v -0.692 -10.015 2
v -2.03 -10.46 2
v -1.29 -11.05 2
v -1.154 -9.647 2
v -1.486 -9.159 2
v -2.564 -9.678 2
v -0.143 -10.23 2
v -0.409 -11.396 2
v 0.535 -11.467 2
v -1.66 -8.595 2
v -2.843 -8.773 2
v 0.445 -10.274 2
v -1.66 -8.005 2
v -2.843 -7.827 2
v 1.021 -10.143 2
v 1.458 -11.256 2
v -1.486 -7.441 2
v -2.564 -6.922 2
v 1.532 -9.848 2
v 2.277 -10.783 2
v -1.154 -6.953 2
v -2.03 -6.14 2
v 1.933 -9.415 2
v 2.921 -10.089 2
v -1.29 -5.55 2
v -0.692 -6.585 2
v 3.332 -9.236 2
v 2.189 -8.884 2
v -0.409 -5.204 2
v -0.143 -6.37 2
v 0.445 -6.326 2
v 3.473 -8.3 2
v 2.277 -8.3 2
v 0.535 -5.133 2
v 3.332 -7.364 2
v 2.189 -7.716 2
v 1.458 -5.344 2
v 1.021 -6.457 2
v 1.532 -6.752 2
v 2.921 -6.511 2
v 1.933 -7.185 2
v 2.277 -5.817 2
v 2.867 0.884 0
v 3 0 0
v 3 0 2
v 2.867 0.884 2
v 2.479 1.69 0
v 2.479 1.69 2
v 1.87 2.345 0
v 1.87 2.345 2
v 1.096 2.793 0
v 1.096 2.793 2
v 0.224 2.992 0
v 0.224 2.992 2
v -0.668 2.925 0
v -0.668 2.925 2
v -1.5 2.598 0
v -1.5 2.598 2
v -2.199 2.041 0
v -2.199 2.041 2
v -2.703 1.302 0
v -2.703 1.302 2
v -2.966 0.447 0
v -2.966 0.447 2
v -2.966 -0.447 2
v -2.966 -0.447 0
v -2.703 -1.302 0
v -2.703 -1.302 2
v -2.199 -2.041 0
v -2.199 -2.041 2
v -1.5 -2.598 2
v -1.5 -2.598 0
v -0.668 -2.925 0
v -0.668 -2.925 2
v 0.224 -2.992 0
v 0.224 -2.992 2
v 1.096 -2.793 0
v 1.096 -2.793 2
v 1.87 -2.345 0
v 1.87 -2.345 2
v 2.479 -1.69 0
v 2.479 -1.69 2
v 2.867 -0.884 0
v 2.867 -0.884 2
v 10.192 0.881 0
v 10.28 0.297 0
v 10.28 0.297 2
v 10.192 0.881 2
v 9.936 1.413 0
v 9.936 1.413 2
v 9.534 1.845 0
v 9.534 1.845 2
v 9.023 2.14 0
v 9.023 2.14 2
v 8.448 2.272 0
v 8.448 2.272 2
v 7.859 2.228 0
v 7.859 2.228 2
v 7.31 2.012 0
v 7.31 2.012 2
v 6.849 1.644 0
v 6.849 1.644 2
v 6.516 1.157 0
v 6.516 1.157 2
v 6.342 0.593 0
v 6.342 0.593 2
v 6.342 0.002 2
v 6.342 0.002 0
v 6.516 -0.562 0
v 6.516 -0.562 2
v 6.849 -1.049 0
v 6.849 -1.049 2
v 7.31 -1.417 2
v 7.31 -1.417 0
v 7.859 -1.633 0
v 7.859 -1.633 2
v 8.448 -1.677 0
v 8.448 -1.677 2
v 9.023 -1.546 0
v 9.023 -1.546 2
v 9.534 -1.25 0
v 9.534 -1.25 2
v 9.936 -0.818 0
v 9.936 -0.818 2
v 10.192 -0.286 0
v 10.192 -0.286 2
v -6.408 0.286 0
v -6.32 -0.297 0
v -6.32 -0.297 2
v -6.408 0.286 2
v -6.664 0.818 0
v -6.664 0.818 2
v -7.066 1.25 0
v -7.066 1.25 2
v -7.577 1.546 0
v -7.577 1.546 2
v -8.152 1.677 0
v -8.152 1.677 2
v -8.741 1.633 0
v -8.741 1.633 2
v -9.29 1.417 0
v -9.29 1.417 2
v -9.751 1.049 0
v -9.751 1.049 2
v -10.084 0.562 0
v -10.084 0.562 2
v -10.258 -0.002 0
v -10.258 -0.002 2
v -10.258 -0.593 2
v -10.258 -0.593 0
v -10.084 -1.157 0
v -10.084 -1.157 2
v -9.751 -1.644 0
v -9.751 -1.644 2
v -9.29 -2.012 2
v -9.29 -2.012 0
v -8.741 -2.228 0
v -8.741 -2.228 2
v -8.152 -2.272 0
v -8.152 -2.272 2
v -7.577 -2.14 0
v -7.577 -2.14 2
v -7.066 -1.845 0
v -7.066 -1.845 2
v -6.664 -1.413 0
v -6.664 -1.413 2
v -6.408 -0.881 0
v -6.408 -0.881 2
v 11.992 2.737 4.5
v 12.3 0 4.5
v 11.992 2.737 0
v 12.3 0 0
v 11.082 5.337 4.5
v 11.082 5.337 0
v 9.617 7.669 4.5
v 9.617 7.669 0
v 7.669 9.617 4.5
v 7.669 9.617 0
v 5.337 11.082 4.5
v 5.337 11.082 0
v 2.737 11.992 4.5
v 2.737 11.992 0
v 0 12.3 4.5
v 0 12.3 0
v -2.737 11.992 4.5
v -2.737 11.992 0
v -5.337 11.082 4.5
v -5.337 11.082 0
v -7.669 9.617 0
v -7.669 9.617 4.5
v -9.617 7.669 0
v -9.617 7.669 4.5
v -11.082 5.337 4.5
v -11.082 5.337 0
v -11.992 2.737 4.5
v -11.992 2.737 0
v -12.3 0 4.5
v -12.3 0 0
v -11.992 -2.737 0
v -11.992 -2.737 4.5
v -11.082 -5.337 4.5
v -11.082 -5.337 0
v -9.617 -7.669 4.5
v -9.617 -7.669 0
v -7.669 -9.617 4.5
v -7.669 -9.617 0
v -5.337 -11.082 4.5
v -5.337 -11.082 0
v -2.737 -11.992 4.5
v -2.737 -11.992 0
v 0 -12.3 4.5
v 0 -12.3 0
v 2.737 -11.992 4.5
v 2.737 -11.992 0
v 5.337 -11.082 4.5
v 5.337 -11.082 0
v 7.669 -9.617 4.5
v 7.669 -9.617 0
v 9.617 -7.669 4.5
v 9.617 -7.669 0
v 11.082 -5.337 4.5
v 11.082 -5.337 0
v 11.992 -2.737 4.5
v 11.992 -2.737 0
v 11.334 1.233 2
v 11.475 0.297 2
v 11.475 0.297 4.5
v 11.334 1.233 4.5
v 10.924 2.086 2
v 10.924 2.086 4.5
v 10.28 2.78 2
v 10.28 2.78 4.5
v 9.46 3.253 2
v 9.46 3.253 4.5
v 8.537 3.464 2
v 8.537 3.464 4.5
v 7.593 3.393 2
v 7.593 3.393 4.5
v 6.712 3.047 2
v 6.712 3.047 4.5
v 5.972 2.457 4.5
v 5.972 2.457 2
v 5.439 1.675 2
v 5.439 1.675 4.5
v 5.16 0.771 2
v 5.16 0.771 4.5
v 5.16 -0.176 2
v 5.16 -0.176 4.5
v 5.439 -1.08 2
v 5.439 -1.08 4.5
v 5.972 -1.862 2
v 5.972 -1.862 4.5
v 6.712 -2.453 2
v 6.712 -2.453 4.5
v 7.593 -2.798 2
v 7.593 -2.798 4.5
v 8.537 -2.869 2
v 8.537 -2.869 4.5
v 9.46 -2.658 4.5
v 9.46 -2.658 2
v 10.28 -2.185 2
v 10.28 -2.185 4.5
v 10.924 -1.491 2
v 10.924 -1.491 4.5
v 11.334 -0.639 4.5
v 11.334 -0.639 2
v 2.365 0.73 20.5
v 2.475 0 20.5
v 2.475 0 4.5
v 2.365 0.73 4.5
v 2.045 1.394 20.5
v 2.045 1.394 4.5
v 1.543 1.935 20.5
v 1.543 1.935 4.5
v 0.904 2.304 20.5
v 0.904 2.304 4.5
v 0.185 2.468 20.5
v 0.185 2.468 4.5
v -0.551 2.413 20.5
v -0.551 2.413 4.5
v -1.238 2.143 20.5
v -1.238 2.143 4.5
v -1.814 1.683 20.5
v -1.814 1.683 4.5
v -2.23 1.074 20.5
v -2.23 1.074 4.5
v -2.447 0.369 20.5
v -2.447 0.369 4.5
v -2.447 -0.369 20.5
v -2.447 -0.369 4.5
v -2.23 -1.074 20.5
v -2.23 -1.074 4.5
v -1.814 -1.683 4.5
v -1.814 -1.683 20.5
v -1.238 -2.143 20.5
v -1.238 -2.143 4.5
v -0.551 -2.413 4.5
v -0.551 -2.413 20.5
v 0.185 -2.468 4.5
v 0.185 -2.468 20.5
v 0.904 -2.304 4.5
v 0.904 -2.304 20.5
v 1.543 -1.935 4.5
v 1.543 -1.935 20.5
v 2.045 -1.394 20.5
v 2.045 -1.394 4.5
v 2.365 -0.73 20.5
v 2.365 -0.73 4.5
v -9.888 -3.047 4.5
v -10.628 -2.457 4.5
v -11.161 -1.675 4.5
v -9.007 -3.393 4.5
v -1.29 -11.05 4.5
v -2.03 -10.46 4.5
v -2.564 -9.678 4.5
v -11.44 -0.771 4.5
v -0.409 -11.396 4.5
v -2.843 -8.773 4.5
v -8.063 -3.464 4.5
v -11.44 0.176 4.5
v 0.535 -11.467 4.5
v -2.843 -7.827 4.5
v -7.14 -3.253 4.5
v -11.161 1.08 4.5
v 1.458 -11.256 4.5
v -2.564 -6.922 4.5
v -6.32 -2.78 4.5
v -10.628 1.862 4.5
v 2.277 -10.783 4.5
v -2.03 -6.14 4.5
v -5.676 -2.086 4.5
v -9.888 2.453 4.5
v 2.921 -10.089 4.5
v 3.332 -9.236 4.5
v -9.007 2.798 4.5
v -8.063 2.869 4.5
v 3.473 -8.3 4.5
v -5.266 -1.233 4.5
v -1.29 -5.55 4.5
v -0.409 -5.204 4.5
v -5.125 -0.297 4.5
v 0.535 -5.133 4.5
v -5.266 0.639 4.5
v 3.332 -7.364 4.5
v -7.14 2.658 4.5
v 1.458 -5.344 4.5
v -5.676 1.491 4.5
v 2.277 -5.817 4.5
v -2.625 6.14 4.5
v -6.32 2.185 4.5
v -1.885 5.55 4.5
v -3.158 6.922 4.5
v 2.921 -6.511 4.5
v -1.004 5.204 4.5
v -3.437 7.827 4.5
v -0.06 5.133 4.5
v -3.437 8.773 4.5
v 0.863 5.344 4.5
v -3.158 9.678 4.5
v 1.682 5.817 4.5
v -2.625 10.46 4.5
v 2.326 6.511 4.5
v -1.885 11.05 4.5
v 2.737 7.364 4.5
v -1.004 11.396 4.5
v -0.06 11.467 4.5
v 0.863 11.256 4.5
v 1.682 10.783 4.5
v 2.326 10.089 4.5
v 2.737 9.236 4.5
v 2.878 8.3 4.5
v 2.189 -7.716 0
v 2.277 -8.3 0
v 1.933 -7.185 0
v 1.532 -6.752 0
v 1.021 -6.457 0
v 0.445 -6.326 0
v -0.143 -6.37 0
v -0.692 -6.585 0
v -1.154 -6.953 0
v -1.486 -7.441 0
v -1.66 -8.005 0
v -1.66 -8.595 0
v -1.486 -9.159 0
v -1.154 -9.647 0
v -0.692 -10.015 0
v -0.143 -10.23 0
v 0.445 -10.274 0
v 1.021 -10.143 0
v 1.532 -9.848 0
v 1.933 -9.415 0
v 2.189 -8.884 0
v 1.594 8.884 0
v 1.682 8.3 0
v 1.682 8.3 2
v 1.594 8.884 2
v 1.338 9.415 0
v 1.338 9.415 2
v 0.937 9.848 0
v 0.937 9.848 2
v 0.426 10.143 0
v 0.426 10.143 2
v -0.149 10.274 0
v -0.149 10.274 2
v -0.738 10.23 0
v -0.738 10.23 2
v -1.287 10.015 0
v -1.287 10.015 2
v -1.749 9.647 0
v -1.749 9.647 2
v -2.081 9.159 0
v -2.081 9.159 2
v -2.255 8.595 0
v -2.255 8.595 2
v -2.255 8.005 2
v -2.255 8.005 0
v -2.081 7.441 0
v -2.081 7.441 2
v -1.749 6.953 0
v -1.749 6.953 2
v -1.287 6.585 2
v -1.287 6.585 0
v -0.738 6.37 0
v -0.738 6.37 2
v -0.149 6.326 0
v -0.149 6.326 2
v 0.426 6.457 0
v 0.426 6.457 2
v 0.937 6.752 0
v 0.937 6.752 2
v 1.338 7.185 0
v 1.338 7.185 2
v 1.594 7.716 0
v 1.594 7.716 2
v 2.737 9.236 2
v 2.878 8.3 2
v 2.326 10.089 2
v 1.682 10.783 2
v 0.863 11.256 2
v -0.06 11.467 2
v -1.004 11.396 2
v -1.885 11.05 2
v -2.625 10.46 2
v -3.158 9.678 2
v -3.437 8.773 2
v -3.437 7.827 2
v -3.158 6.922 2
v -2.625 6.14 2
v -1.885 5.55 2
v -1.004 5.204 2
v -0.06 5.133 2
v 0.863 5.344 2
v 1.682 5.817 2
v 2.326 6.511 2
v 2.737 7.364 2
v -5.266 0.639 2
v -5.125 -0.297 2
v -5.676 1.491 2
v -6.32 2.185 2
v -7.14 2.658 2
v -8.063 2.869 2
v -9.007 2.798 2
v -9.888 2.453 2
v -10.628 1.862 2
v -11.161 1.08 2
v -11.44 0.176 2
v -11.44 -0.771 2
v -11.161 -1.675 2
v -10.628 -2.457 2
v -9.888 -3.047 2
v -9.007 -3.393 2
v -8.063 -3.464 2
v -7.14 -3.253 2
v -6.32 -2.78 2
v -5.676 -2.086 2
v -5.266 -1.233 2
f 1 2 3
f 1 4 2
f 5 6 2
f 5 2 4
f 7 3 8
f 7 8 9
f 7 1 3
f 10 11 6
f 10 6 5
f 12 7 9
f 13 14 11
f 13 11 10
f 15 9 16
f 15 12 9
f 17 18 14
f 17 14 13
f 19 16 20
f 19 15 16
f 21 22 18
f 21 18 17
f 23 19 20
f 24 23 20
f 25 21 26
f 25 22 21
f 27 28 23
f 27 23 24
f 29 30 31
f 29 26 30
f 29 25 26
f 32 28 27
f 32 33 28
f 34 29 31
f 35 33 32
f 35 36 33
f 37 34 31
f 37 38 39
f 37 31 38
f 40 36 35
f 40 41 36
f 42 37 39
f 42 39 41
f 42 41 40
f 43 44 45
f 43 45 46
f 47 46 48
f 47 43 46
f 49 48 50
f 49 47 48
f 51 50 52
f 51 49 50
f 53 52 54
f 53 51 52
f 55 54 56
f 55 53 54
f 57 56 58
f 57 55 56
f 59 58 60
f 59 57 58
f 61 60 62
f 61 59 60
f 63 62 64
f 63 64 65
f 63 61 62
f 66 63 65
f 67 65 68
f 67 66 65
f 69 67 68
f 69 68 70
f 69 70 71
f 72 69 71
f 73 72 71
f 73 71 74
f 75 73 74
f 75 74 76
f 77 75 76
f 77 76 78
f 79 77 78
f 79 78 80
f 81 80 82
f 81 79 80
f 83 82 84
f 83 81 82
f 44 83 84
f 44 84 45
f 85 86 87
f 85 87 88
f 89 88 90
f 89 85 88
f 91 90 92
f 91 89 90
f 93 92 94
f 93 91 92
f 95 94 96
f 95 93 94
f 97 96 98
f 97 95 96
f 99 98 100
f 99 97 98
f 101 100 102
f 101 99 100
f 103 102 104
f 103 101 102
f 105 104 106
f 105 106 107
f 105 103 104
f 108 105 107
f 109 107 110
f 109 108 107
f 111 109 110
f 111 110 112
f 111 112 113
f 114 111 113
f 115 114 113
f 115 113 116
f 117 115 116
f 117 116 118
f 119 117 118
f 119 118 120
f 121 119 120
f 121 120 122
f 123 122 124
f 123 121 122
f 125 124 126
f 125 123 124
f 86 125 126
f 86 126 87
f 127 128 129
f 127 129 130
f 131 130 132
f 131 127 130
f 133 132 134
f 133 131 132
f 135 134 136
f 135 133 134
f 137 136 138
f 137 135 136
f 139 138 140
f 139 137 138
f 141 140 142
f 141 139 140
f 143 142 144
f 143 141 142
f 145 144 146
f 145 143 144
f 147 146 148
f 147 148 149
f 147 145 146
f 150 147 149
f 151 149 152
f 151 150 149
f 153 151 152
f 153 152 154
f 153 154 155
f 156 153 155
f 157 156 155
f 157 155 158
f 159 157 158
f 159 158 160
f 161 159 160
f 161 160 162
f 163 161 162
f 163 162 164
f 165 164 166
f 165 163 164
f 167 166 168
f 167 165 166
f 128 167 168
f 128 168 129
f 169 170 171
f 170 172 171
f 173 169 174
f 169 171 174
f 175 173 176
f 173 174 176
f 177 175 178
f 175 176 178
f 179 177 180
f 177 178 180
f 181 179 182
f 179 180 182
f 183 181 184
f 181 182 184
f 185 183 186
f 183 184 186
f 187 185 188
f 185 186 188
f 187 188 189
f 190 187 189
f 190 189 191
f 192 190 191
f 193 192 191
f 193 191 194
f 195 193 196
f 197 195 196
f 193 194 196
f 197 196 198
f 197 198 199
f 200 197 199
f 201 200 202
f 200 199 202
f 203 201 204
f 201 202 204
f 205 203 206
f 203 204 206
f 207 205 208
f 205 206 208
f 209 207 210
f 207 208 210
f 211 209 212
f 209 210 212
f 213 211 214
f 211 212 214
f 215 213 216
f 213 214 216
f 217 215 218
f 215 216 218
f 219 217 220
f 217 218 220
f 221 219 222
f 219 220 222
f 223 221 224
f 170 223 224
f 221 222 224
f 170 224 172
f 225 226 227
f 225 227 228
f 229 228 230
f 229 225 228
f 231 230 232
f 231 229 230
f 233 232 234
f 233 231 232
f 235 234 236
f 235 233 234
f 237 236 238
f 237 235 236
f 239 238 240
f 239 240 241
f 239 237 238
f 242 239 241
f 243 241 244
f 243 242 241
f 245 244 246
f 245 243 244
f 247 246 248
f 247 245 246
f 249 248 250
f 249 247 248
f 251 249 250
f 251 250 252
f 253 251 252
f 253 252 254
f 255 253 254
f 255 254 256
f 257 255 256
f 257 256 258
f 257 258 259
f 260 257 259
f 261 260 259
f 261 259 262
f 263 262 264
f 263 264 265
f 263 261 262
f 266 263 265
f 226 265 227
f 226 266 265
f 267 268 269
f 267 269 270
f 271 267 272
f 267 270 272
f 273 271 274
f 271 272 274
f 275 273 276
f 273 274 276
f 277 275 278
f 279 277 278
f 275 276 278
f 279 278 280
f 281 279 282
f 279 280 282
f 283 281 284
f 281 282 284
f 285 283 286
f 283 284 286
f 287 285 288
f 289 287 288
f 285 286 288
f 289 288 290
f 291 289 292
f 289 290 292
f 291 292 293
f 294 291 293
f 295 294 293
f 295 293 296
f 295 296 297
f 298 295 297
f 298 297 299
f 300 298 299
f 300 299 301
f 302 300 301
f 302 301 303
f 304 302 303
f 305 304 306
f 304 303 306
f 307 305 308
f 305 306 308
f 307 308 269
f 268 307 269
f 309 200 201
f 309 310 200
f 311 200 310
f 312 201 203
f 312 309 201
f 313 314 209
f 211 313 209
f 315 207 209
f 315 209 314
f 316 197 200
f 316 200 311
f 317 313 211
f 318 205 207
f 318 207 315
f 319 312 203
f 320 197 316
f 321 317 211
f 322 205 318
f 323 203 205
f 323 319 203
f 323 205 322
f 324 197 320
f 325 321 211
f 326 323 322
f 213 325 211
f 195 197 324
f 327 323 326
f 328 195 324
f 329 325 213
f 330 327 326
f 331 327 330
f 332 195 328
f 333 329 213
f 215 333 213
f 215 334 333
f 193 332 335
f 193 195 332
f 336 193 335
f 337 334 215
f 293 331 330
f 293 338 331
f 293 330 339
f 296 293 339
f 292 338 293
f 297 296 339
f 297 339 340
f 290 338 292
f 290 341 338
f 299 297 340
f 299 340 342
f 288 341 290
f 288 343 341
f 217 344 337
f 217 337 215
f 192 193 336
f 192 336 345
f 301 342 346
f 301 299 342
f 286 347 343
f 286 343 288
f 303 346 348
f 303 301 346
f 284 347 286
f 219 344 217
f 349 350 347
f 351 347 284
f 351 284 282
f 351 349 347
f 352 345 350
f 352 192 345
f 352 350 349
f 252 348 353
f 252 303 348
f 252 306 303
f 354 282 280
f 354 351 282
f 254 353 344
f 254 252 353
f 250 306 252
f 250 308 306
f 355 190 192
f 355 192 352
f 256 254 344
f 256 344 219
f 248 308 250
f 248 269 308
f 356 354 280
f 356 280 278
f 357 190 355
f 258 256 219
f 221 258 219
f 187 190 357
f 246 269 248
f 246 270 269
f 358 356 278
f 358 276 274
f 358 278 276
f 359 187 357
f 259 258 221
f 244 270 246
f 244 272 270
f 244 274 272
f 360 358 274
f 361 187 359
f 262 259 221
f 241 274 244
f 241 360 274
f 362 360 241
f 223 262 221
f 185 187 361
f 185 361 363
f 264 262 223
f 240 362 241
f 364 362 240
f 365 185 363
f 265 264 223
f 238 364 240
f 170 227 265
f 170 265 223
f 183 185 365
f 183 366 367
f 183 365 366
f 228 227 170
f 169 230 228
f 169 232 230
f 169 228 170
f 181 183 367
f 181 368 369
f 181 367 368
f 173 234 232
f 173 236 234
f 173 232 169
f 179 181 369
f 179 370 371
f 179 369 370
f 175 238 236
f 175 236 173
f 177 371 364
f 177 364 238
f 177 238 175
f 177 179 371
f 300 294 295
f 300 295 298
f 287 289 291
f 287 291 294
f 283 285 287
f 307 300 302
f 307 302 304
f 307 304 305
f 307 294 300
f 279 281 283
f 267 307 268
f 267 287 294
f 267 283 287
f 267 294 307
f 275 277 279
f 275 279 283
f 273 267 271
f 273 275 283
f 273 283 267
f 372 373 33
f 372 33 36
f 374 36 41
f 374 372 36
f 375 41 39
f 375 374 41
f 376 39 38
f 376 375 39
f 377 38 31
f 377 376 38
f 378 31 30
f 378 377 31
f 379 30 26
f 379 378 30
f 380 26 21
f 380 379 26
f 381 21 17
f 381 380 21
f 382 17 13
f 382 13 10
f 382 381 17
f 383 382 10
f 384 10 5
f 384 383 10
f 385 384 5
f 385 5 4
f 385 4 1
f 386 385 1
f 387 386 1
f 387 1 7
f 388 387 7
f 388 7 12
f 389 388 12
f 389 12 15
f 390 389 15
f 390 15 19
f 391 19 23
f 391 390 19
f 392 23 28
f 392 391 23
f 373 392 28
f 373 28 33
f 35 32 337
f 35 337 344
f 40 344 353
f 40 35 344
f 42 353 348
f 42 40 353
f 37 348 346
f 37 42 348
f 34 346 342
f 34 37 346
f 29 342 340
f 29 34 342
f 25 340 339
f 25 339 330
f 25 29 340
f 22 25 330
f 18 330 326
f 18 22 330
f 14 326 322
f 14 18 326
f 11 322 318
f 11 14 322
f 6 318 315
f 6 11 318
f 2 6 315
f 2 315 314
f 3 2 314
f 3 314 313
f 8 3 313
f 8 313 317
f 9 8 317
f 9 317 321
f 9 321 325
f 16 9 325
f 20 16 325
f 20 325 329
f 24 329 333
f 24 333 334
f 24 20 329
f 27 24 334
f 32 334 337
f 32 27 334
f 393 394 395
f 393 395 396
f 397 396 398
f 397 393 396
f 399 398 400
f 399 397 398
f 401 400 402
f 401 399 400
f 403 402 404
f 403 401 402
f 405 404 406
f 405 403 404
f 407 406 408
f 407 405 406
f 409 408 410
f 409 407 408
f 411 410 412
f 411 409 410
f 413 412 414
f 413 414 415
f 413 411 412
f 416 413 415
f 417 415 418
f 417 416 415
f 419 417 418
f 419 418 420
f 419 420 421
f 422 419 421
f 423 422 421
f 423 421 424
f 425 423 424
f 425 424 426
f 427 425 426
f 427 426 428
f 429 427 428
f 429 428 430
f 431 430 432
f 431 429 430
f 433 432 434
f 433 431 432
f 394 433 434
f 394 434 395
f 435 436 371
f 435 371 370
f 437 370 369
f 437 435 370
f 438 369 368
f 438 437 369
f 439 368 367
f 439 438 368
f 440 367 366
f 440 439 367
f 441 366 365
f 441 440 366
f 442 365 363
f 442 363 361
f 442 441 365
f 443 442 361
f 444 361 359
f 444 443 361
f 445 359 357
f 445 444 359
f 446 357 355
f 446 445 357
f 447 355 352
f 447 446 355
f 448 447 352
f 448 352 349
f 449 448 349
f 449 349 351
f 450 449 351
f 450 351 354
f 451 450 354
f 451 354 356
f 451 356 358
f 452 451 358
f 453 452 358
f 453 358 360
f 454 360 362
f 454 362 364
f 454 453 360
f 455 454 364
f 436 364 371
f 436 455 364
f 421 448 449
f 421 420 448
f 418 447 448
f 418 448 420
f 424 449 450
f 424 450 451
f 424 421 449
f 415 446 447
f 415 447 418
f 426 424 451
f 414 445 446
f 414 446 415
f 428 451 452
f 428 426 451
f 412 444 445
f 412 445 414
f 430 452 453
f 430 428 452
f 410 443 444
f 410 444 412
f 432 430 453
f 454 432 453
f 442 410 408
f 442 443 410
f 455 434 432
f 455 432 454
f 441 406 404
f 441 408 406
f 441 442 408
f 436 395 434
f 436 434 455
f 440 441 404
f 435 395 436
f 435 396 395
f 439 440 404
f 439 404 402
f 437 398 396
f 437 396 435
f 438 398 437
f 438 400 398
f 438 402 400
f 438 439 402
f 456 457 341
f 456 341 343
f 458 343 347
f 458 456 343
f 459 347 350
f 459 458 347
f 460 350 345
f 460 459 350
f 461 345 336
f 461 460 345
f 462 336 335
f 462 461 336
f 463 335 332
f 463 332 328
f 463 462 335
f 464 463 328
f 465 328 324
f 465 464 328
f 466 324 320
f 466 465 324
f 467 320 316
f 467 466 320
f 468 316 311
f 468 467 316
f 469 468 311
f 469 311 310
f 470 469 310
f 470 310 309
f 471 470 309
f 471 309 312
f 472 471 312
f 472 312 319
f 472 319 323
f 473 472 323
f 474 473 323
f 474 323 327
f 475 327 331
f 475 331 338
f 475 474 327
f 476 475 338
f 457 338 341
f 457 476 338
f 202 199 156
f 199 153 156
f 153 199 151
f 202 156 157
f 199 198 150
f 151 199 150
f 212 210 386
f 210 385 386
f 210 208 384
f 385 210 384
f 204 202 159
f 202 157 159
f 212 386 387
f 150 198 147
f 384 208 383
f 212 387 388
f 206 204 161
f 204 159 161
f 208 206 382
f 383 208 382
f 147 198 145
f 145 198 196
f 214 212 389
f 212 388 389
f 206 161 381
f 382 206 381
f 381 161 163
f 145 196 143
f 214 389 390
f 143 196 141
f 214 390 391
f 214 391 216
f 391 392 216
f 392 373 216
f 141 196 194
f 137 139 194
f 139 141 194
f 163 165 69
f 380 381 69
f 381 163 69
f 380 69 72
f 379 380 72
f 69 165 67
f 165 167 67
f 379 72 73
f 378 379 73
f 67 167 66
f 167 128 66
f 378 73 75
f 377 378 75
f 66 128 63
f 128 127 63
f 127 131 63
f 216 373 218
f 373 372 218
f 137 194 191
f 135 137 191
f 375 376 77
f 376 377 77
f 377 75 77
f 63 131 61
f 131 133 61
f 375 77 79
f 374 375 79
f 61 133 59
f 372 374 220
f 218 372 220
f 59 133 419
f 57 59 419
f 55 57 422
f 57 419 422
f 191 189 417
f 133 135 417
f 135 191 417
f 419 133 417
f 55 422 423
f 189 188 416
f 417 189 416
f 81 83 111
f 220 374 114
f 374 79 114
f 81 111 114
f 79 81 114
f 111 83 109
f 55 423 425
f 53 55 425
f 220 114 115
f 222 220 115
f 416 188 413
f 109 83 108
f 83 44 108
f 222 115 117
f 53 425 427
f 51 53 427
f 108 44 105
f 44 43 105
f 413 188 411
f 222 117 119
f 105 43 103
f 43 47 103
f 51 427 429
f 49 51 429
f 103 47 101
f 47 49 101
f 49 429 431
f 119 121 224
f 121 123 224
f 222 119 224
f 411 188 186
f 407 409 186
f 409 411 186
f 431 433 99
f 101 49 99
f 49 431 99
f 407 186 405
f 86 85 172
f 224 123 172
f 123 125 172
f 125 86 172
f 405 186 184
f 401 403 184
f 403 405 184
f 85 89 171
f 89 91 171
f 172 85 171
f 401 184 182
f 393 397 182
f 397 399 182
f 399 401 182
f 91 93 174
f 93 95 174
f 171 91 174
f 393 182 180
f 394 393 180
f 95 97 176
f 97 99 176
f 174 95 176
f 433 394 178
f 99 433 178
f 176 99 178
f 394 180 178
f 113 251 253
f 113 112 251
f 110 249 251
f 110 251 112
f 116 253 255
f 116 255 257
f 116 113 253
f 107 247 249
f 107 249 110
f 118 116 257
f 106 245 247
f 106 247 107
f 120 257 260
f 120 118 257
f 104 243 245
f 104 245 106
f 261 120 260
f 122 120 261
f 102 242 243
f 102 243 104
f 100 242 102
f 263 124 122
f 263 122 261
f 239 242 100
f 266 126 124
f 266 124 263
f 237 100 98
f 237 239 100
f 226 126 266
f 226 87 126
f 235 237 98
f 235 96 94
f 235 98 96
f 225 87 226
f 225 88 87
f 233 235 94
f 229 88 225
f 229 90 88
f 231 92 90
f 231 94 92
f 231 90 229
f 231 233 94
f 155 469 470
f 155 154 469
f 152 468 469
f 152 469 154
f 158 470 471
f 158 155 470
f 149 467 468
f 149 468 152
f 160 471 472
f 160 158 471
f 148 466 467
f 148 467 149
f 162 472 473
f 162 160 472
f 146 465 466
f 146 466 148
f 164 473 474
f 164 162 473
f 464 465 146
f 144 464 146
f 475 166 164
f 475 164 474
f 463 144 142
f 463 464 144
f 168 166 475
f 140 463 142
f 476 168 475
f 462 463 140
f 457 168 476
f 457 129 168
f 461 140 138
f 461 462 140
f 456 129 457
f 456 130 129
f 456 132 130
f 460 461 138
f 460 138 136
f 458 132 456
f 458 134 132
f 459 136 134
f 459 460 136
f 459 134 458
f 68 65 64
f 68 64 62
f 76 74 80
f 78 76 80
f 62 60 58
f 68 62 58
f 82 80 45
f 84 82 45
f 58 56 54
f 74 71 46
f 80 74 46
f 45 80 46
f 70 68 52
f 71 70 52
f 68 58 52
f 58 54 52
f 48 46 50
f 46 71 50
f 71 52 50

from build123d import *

# Parameters (mm, degrees)
ESQUISSE1_R        = 12.3
ESQUISSE1_R_2      = 1.97989757
ESQUISSE1_R_3      = 3
BOSS_EXTRU_1_DEPTH = 2
ESQUISSE2_R        = 12.3
ESQUISSE2_R_2      = 3.175426481
ESQUISSE2_R_3      = 3
BOSS_EXTRU_2_DEPTH = 2.5
ESQUISSE3_R        = 2.475
BOSS_EXTRU_3_DEPTH = 16


with BuildPart() as part:
    # Esquisse1 → Boss.-Extru.1 (new body)
    with BuildSketch(Plane.XY):
        Circle(ESQUISSE1_R)
        with Locations((-8.3, -0.297454923)):
            Circle(ESQUISSE1_R_2, mode=Mode.SUBTRACT)
        with Locations((-0.297454923, 8.3)):
            Circle(ESQUISSE1_R_2, mode=Mode.SUBTRACT)
        with Locations((8.3, 0.297454923)):
            Circle(ESQUISSE1_R_2, mode=Mode.SUBTRACT)
        with Locations((0.297454923, -8.3)):
            Circle(ESQUISSE1_R_2, mode=Mode.SUBTRACT)
        Circle(ESQUISSE1_R_3, mode=Mode.SUBTRACT)
    extrude(amount=BOSS_EXTRU_1_DEPTH)

    # Esquisse2 → Boss.-Extru.2 (add)
    # profile 1 of 2: a face of its own
    with BuildSketch(Plane.XY.offset(2)):
        Circle(ESQUISSE2_R)
        with Locations((0.297454923, -8.3)):
            Circle(ESQUISSE2_R_2, mode=Mode.SUBTRACT)
        with Locations((8.3, 0.297454923)):
            Circle(ESQUISSE2_R_2, mode=Mode.SUBTRACT)
        with Locations((-0.297454923, 8.3)):
            Circle(ESQUISSE2_R_2, mode=Mode.SUBTRACT)
        with Locations((-8.3, -0.297454923)):
            Circle(ESQUISSE2_R_2, mode=Mode.SUBTRACT)
        Circle(ESQUISSE2_R_3, mode=Mode.SUBTRACT)
    # profile 2 of 2: a face of its own
    with BuildSketch(Plane.XY.offset(2)):
        Circle(ESQUISSE2_R_3)
    extrude(amount=BOSS_EXTRU_2_DEPTH)

    # Esquisse3 → Boss.-Extru.3 (add)
    with BuildSketch(Plane.XY.offset(4.5)):
        Circle(ESQUISSE3_R)
    extrude(amount=BOSS_EXTRU_3_DEPTH)


solid = part.part
